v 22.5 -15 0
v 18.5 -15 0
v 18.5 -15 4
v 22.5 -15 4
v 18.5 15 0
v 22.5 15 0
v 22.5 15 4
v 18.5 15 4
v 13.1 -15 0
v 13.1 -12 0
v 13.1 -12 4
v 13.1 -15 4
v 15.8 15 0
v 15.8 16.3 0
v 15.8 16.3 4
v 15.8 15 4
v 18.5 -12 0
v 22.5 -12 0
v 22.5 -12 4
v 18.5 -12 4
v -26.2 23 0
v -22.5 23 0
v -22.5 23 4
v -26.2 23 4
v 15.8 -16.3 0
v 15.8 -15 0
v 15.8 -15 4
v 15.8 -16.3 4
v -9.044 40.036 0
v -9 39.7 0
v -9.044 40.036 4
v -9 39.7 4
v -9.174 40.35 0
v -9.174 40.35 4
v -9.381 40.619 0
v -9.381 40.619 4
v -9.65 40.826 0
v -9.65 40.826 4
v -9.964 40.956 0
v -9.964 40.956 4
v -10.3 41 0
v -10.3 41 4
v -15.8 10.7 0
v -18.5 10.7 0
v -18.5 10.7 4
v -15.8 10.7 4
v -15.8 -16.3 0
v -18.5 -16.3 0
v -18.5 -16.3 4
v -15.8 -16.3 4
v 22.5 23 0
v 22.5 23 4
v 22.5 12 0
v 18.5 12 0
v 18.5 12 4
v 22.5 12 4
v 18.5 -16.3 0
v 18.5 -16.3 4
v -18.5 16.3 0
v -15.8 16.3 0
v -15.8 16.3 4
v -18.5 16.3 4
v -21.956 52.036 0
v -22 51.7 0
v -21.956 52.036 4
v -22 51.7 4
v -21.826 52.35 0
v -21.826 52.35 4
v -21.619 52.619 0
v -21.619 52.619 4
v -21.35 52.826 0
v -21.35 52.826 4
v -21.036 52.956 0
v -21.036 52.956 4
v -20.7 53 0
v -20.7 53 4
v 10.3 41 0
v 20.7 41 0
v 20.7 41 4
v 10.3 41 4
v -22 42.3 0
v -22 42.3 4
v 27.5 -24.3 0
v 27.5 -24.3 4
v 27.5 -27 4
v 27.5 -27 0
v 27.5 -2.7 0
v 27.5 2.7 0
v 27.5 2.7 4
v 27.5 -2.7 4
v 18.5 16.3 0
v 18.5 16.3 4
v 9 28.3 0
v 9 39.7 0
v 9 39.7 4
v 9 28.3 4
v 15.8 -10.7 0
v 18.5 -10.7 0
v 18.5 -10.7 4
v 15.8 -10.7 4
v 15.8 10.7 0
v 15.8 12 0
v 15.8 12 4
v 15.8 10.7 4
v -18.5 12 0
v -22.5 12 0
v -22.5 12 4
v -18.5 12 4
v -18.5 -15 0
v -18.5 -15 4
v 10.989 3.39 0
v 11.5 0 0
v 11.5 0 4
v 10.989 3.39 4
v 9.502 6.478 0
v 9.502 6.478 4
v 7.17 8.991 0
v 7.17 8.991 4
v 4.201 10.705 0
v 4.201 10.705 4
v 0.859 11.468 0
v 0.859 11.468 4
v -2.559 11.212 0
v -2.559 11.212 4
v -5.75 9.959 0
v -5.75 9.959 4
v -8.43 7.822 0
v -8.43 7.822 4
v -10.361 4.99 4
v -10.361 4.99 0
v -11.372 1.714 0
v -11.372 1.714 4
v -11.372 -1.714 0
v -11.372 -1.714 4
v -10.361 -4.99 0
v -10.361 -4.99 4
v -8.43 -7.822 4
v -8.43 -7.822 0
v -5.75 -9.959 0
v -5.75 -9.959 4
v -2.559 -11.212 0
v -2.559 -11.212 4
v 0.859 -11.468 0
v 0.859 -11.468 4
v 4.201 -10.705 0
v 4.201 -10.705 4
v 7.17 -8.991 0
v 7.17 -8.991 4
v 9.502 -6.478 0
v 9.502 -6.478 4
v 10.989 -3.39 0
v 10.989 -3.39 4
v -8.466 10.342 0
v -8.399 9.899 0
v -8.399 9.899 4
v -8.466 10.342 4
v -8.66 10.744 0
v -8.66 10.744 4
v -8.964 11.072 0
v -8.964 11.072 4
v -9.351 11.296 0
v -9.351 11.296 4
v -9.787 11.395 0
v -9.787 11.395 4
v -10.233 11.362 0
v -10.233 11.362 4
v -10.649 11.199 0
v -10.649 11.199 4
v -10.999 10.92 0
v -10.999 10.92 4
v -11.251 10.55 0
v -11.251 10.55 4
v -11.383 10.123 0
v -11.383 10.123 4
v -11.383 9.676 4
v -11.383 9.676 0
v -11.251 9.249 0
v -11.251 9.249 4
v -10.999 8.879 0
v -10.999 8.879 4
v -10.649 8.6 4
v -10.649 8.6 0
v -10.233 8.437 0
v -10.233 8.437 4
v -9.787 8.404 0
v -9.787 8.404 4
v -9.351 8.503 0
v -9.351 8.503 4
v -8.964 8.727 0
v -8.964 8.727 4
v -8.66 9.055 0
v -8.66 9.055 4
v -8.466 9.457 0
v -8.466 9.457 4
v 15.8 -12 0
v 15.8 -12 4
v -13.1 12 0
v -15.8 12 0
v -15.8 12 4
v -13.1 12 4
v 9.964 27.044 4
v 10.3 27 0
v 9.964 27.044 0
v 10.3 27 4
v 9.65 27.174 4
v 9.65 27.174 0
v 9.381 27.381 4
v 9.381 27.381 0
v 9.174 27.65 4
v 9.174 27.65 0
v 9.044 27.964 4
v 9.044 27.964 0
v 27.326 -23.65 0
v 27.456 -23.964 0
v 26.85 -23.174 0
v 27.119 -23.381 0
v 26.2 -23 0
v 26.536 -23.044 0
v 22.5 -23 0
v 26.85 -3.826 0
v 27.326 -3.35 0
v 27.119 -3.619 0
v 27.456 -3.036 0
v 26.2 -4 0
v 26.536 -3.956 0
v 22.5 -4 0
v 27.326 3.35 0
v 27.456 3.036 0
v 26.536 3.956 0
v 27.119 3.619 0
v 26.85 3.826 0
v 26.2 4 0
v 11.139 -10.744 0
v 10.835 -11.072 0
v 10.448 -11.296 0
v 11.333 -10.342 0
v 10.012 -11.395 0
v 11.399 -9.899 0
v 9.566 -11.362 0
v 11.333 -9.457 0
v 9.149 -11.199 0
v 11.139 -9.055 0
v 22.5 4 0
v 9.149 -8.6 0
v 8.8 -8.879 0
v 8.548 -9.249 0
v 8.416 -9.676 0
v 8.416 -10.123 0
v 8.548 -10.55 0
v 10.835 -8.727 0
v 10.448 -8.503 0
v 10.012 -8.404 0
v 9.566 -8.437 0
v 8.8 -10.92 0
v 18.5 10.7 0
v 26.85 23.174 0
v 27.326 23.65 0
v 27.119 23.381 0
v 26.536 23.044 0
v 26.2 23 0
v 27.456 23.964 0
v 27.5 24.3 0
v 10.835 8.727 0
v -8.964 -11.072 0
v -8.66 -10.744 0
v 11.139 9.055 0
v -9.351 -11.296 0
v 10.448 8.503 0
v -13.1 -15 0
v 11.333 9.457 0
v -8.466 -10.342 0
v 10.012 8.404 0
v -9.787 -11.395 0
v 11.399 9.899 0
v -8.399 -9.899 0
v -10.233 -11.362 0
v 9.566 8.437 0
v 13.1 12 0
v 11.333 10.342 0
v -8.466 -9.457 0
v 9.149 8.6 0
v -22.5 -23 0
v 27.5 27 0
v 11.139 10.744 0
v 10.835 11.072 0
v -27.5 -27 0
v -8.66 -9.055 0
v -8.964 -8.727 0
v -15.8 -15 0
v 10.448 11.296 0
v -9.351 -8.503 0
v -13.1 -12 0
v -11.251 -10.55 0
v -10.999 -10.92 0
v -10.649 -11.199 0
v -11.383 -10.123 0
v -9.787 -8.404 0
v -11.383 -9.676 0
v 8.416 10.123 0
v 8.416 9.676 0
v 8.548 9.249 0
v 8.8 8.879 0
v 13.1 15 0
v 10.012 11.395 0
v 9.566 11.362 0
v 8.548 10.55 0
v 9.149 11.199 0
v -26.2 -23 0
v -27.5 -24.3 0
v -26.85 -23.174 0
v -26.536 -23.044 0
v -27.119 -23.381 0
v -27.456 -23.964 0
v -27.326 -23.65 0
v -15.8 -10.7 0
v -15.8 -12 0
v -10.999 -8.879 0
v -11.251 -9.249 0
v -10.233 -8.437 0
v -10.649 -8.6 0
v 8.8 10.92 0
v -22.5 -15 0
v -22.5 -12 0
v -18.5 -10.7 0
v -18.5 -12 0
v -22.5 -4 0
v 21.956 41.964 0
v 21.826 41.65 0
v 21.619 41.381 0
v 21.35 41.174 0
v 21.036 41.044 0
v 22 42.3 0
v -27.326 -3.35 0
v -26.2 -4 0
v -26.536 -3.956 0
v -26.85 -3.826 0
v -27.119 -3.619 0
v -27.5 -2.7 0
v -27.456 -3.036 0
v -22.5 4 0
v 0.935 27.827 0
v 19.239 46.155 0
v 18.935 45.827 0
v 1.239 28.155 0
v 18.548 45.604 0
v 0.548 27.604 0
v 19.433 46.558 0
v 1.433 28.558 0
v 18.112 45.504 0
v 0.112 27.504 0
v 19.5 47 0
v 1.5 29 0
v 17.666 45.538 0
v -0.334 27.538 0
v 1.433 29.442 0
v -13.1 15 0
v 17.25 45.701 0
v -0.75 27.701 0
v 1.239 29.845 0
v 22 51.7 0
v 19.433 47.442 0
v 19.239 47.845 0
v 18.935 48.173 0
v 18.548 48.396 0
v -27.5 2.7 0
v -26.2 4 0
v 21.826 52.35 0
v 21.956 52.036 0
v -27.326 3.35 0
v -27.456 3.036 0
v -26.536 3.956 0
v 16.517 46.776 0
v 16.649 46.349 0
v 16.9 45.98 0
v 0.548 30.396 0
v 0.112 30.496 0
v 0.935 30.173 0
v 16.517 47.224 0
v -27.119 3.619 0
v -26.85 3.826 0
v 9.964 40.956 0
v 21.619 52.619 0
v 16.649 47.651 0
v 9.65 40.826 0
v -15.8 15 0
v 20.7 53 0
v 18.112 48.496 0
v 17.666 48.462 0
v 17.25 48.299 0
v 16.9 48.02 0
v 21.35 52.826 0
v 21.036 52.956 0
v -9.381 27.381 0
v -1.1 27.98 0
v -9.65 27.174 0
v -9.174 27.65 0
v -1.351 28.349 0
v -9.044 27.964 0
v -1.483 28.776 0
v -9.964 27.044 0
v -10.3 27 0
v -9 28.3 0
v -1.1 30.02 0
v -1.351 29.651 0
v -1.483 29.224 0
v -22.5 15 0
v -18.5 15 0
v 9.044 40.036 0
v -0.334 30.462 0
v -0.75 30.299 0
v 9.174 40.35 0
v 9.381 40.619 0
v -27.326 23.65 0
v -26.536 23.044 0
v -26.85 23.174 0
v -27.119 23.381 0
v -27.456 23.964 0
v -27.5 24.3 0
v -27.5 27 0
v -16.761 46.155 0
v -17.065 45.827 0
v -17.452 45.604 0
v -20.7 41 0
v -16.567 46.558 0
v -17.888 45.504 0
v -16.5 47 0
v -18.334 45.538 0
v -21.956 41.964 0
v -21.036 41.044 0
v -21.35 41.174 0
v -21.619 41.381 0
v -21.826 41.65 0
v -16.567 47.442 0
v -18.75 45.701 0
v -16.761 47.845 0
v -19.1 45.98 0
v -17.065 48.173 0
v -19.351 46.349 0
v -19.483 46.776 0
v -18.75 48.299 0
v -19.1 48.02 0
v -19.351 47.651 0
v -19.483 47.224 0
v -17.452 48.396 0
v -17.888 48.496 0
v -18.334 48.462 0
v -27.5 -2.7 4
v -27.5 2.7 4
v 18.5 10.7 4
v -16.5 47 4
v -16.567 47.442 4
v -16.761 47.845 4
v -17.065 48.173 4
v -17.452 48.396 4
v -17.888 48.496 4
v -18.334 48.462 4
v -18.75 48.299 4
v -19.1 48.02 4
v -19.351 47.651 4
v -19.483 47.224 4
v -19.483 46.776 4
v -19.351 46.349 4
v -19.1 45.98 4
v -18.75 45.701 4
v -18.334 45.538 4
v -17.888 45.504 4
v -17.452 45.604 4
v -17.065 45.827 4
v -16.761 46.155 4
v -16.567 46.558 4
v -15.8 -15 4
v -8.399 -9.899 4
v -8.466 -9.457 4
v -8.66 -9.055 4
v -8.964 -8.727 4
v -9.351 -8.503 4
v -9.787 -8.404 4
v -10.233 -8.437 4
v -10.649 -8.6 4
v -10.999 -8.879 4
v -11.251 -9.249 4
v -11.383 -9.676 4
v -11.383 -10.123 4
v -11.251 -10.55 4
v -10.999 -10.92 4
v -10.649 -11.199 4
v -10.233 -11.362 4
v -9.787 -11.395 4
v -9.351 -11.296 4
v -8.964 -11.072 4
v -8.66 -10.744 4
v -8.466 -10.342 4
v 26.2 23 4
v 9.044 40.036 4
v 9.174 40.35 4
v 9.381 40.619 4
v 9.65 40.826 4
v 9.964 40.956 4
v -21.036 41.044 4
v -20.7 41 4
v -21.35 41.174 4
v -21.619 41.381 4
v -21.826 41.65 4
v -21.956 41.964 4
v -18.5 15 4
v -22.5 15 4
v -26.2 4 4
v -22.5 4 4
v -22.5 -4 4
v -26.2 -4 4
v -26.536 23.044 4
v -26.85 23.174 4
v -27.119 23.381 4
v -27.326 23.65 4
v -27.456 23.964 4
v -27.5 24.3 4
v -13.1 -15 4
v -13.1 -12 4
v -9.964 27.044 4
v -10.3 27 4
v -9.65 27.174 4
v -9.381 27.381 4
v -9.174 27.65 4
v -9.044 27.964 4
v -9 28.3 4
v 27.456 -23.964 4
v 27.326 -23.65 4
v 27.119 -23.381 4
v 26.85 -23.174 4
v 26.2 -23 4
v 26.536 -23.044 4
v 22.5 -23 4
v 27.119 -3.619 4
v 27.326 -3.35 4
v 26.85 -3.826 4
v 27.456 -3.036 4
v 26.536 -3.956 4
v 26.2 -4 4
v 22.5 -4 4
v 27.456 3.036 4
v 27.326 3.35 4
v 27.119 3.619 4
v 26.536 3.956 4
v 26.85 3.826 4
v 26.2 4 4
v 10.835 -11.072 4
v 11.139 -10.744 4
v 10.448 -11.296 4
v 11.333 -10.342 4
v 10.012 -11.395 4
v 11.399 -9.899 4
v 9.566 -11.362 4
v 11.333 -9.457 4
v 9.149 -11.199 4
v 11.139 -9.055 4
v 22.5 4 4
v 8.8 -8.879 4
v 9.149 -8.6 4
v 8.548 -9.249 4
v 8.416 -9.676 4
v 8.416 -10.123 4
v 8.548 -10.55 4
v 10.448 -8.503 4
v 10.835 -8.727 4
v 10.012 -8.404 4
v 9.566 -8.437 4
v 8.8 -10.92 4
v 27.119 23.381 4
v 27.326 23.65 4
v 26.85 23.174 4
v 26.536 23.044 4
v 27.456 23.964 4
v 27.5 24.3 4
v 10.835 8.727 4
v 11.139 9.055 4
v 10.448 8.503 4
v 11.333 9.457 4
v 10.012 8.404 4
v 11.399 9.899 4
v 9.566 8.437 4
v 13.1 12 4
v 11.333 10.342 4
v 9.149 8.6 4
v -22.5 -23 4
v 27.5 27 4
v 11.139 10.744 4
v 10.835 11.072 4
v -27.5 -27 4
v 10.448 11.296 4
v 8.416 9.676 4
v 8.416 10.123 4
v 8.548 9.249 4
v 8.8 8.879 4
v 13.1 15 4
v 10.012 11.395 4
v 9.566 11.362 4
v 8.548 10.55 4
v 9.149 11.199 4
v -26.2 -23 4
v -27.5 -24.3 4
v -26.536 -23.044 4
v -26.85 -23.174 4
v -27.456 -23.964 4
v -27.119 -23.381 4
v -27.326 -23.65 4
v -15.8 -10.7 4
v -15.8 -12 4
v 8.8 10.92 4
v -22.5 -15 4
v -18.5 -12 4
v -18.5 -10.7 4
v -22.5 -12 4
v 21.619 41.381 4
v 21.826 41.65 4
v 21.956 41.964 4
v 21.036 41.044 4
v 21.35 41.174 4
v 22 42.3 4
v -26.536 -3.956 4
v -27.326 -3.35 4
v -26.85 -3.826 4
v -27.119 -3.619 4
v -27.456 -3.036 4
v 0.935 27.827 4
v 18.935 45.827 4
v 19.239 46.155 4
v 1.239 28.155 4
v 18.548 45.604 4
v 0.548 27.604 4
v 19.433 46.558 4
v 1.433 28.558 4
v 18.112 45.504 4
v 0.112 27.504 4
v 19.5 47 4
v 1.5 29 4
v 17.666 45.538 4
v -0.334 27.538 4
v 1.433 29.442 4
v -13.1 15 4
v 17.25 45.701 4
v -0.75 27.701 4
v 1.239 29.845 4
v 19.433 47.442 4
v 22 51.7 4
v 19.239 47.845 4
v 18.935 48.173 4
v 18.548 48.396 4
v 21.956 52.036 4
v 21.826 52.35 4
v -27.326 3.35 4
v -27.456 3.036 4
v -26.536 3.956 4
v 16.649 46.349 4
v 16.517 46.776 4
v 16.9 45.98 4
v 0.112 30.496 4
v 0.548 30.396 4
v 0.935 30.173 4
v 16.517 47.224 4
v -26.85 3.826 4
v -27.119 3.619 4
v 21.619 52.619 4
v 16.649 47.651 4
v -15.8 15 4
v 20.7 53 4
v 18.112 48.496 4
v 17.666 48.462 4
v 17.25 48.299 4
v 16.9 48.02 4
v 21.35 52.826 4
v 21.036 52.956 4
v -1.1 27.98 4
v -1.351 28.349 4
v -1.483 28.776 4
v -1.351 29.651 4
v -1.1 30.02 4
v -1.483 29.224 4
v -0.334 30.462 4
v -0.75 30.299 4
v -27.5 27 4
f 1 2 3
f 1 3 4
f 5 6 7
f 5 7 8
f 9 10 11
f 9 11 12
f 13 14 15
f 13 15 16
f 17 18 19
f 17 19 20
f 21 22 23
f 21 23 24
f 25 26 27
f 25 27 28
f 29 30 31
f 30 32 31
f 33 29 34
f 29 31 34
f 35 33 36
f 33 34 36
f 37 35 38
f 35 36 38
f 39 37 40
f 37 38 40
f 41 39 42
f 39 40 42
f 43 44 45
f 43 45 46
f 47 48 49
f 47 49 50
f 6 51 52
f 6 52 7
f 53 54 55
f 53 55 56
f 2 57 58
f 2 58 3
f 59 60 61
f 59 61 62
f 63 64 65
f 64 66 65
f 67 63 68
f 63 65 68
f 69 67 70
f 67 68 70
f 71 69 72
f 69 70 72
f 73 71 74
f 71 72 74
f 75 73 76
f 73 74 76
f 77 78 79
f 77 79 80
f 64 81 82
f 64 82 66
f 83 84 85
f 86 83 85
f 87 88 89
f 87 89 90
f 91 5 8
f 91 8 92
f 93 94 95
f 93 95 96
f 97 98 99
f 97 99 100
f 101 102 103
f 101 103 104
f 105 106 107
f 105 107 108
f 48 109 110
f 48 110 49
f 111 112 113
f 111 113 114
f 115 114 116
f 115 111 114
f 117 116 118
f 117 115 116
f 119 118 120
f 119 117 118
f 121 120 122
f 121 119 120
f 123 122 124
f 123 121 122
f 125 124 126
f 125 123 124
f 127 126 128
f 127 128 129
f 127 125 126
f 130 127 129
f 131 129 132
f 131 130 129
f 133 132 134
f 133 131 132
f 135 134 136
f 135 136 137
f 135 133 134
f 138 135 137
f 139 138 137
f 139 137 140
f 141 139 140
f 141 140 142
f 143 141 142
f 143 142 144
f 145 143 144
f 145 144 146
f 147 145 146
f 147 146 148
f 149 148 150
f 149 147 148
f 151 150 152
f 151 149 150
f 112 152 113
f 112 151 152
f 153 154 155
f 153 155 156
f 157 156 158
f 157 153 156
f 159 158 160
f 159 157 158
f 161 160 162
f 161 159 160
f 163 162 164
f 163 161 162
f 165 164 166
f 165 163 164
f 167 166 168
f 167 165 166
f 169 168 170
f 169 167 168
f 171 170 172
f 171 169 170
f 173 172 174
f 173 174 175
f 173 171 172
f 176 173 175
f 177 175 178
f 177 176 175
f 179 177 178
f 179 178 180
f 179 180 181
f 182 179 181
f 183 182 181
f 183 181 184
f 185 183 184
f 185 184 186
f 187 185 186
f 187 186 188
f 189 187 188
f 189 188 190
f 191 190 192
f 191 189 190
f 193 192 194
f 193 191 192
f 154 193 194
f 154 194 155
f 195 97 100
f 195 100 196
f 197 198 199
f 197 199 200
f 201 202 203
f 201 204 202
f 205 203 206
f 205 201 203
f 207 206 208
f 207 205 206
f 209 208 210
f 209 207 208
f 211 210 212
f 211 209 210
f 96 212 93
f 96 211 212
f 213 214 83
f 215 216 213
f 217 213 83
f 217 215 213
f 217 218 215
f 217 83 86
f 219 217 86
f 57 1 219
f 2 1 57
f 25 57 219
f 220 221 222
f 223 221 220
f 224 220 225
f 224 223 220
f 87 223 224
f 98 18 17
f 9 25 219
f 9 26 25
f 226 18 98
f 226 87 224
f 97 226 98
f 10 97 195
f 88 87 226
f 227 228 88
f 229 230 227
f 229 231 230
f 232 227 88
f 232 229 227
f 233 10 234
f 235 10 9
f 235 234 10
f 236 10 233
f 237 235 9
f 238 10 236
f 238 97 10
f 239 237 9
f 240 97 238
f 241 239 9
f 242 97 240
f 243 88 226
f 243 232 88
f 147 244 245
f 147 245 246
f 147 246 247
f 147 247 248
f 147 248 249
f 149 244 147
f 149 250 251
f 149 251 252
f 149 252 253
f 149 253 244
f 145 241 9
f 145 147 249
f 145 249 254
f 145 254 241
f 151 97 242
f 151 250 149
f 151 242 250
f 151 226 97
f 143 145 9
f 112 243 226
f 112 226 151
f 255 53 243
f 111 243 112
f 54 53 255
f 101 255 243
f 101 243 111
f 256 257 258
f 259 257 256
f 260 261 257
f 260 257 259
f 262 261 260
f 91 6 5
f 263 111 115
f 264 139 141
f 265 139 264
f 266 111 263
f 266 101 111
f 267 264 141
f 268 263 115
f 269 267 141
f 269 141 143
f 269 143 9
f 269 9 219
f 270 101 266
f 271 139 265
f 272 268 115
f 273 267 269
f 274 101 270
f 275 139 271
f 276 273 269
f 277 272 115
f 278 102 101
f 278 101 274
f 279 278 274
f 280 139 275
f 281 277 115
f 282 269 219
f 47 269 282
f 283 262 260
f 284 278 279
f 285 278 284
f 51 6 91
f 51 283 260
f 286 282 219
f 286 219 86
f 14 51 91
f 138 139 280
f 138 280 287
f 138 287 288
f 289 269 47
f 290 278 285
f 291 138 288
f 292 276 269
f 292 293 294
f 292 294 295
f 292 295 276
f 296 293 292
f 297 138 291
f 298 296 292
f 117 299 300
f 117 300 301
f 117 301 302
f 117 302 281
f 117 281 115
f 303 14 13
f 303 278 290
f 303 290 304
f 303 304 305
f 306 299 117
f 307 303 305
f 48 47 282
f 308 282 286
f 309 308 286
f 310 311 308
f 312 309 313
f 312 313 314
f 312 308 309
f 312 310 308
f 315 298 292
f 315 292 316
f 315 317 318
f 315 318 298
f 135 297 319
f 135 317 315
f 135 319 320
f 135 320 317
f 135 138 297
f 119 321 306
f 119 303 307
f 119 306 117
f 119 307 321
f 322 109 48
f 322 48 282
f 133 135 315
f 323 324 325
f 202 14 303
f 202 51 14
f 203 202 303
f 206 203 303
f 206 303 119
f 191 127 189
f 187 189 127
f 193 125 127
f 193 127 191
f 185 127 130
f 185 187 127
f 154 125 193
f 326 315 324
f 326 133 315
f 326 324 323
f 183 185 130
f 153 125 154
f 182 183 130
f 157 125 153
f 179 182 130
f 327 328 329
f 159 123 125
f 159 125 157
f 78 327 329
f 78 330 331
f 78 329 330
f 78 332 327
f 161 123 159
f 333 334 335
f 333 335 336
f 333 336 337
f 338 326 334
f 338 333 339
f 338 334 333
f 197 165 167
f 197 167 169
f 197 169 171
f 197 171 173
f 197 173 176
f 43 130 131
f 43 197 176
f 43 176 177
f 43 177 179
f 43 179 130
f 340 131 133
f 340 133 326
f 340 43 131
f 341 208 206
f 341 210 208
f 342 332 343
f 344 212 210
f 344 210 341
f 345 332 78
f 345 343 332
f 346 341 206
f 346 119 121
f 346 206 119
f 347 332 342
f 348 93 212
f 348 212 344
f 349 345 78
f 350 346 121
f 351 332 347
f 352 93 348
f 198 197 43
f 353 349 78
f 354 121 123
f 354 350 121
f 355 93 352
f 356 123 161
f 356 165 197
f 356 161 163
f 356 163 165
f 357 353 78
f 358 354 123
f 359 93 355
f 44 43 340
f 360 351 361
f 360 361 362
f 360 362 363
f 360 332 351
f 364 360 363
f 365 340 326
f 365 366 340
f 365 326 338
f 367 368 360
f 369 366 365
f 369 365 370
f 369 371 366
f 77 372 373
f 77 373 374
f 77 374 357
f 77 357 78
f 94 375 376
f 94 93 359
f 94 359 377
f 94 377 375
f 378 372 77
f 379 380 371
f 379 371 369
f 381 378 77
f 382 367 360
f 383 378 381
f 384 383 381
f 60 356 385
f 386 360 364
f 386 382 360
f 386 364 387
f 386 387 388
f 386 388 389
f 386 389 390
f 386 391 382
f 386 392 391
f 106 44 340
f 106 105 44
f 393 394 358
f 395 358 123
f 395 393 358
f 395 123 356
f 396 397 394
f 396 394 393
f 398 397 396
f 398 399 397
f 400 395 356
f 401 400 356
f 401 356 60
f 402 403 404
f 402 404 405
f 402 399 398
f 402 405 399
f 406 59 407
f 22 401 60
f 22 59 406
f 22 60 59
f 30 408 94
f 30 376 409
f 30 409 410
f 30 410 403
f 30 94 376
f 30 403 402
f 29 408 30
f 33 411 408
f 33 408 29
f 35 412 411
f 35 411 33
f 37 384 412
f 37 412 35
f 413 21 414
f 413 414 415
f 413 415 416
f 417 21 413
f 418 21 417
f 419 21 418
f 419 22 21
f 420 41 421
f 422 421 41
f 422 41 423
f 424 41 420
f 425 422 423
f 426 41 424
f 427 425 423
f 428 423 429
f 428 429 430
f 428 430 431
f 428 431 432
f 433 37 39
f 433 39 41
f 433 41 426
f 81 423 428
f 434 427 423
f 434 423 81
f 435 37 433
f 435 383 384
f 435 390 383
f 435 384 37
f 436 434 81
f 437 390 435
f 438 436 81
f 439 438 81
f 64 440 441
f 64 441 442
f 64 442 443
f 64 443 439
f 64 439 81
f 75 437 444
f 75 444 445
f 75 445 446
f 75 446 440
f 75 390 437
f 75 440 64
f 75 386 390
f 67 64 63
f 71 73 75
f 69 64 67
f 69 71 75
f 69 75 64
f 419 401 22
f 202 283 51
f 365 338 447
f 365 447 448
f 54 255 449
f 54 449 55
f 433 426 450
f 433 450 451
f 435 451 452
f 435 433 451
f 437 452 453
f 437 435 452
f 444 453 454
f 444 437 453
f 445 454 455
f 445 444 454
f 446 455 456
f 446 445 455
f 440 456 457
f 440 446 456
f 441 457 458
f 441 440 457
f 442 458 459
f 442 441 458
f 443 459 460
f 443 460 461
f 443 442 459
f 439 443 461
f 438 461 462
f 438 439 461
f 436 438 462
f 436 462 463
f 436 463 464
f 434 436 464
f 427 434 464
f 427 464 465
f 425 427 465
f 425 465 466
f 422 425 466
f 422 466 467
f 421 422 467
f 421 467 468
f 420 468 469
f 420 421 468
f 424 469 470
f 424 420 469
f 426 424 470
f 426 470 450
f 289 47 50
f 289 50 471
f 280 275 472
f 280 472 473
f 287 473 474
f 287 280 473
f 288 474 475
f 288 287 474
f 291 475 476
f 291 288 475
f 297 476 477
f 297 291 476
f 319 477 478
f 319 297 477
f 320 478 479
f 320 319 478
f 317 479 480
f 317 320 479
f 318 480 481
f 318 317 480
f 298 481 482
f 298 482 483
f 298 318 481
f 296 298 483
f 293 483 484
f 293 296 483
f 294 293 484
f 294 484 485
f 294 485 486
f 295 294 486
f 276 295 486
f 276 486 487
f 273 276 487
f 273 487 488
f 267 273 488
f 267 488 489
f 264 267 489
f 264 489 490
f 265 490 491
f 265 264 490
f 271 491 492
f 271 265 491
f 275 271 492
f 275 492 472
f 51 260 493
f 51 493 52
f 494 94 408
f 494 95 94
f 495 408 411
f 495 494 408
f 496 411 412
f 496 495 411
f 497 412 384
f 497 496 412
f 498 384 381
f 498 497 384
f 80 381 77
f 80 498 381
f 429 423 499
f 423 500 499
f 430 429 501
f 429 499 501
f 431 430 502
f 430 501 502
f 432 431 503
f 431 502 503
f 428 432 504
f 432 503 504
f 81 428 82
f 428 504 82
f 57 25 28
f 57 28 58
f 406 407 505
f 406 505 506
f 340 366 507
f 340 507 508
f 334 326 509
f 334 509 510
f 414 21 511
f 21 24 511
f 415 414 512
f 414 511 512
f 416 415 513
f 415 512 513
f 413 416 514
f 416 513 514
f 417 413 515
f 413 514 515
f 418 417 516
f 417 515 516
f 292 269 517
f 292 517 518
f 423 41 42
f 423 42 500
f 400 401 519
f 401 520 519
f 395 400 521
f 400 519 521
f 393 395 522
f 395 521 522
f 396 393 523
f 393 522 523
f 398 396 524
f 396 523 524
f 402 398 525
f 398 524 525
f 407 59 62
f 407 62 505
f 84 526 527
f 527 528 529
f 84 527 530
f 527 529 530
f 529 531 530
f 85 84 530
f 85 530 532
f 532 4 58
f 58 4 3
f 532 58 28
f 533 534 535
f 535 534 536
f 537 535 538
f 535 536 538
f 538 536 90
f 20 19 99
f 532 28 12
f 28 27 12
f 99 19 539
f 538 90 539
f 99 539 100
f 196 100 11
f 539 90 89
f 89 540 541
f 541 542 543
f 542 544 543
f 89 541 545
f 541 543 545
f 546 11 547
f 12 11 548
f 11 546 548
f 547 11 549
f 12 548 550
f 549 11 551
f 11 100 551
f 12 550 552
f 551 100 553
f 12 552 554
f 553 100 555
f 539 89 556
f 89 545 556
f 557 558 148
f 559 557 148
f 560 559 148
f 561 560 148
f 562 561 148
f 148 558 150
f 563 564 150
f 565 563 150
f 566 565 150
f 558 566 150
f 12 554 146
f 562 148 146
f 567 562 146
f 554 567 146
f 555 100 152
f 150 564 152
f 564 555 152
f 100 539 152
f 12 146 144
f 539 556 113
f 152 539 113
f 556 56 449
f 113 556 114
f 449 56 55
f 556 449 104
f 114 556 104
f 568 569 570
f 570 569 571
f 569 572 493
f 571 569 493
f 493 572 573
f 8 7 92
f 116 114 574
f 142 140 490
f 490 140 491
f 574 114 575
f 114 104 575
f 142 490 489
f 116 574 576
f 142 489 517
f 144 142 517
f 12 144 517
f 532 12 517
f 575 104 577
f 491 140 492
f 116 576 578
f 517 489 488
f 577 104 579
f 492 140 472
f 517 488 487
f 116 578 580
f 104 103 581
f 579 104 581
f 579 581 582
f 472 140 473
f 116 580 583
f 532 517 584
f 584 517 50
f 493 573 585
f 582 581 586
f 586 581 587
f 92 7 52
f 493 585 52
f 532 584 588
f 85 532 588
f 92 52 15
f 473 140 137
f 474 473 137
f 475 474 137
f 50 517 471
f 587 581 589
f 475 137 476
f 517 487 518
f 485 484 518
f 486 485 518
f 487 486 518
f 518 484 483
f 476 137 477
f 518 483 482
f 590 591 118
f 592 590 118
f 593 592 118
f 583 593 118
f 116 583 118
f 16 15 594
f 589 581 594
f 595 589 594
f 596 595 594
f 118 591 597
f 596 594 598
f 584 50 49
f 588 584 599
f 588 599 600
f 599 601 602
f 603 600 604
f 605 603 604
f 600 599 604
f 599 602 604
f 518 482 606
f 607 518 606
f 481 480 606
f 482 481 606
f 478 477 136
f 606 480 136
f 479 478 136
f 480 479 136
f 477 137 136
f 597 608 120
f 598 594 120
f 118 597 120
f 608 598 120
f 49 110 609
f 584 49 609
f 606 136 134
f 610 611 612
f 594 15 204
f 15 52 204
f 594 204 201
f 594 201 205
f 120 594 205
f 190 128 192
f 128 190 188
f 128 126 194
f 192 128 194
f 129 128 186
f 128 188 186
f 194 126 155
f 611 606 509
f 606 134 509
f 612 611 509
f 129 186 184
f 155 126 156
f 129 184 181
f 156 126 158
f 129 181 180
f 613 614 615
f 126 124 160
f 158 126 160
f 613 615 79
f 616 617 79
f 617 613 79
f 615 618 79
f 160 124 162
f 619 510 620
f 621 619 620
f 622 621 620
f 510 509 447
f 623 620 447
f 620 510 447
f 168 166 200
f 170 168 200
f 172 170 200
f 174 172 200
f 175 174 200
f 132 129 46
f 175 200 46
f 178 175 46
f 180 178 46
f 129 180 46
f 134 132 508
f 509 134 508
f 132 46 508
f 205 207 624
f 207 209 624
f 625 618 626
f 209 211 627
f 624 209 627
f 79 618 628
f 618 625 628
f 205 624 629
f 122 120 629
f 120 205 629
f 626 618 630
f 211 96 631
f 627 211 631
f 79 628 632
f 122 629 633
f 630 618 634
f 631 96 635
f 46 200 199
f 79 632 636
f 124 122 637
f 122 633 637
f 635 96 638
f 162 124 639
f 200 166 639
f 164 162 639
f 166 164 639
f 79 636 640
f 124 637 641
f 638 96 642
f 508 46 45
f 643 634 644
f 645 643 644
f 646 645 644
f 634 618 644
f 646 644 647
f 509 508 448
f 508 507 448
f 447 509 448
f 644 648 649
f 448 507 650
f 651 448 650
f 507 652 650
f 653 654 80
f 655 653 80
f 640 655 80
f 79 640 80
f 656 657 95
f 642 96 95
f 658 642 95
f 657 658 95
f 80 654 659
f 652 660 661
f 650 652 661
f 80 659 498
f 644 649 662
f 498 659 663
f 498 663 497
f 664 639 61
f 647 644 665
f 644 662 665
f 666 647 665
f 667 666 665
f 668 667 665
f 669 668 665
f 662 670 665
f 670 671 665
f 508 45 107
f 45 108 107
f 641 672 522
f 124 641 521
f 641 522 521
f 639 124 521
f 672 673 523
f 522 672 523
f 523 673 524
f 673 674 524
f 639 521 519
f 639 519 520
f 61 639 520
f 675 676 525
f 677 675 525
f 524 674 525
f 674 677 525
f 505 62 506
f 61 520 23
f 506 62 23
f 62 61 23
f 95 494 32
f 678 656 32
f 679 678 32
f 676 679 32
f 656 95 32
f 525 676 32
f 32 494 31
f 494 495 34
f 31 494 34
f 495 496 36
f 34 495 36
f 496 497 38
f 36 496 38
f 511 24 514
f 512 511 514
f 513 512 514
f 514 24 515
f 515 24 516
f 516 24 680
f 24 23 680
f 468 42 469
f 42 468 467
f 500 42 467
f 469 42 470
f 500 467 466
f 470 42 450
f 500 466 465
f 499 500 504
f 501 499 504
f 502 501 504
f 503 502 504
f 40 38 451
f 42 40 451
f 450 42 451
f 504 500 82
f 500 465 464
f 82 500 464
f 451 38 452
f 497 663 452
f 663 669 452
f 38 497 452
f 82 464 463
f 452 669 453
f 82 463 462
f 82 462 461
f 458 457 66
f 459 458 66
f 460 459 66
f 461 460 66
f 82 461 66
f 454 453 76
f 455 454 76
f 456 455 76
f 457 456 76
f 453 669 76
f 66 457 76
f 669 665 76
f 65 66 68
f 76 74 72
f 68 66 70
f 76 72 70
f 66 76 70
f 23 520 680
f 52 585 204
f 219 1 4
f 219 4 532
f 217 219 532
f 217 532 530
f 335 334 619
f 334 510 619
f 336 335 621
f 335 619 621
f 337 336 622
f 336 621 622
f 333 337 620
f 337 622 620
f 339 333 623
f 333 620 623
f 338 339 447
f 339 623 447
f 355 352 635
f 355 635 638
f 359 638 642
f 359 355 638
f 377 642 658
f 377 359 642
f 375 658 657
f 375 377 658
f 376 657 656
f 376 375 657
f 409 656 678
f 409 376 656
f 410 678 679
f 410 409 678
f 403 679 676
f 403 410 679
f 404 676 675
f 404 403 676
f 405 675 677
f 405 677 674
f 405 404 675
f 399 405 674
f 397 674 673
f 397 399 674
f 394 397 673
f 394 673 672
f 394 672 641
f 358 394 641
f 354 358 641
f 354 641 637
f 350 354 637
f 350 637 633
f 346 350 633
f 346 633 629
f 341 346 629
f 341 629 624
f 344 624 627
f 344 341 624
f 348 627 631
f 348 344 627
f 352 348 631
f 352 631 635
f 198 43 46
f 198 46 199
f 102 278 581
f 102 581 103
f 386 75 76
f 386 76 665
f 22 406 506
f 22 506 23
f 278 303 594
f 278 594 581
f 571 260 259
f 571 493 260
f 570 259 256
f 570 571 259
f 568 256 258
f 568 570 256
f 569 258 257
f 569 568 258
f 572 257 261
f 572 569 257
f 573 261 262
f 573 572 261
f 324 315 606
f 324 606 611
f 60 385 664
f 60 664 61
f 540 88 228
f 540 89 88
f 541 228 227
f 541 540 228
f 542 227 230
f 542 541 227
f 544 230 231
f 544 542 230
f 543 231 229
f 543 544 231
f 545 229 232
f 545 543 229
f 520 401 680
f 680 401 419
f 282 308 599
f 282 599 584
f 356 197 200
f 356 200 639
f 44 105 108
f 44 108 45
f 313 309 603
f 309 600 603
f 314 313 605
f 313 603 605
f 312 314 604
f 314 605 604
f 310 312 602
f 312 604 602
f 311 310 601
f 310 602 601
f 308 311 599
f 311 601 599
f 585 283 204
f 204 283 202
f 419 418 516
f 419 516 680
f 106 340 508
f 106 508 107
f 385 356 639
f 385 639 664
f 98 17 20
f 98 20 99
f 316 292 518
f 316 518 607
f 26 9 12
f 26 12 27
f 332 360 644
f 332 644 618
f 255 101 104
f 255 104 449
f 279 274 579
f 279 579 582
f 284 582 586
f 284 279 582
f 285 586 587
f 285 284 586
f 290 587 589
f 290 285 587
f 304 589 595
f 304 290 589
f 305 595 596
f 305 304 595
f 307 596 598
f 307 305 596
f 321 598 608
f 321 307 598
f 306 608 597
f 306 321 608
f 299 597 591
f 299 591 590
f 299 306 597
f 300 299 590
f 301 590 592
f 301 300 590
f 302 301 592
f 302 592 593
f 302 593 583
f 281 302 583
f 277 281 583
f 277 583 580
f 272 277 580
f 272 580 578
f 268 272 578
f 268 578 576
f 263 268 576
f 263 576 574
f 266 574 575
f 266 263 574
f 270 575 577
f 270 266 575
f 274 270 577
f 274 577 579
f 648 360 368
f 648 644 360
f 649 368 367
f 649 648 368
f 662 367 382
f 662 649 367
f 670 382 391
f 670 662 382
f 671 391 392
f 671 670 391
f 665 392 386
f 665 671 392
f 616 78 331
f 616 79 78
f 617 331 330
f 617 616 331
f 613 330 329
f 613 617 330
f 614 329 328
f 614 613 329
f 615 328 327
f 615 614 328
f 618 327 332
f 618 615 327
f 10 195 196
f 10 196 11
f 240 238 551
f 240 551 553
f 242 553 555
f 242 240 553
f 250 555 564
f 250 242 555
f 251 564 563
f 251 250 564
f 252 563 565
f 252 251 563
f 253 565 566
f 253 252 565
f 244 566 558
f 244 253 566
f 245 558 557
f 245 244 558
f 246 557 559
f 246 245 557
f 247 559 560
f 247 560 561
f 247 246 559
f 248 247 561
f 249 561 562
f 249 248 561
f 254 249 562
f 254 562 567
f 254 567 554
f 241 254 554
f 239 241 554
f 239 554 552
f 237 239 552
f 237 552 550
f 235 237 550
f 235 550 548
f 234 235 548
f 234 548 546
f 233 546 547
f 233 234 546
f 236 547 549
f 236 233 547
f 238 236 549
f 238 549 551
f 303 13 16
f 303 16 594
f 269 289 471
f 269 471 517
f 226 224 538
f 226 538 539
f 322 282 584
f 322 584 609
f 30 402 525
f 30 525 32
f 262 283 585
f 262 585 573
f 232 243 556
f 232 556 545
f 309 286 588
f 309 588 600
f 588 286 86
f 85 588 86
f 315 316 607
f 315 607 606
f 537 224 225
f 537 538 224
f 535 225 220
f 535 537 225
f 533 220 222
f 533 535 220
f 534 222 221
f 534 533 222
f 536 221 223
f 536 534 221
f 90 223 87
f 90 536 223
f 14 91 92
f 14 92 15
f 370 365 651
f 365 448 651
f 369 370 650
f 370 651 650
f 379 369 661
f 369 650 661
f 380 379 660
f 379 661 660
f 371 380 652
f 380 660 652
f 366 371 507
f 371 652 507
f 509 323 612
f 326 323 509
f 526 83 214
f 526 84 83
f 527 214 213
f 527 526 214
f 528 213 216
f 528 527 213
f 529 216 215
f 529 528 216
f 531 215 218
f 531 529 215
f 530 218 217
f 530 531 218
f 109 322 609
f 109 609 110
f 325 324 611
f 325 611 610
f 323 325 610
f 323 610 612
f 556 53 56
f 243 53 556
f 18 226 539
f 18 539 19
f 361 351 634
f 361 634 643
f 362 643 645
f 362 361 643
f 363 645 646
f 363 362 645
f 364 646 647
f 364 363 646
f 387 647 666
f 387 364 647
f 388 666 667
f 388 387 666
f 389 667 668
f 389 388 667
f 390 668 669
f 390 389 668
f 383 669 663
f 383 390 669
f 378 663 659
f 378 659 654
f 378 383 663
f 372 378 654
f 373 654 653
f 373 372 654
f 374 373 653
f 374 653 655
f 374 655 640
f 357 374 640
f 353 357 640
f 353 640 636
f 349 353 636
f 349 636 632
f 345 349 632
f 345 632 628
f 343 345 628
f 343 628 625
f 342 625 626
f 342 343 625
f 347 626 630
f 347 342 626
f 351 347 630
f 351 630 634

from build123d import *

# Parameters (mm, degrees)
SKETCH_1_R      = 1.5
SKETCH_1_R_2    = 11.5
EXTRUDE_1_DEPTH = 4
FILLET_1_R      = 1.3


with BuildPart() as part:
    # 草图1 → 凸台-拉伸1 (new body)
    with BuildSketch(Plane.XY):
        Polygon((22.5, -27), (-22.5, -27), (-27.5, -27), (-27.5, -23), (-22.5, -23), (-22.5, -15), (-18.5, -15), (-18.5, -16.3), (-15.8, -16.3), (-15.8, -15), (-13.1, -15), (-13.1, -12), (-15.8, -12), (-15.8, -10.7), (-18.5, -10.7), (-18.5, -12), (-22.5, -12), (-22.5, -4), (-27.5, -4), (-27.5, 4), (-22.5, 4), (-22.5, 12), (-18.5, 12), (-18.5, 10.7), (-15.8, 10.7), (-15.8, 12), (-13.1, 12), (-13.1, 15), (-15.8, 15), (-15.8, 16.3), (-18.5, 16.3), (-18.5, 15), (-22.5, 15), (-22.5, 23), (-27.5, 23), (-27.5, 27), (-22.5, 27), (-9, 27), (-9, 41), (-22, 41), (-22, 53), (22, 53), (22, 41), (9, 41), (9, 27), (22.5, 27), (27.5, 27), (27.5, 23), (22.5, 23), (22.5, 15), (18.5, 15), (18.5, 16.3), (15.8, 16.3), (15.8, 15), (13.1, 15), (13.1, 12), (15.8, 12), (15.8, 10.7), (18.5, 10.7), (18.5, 12), (22.5, 12), (22.5, 4), (27.5, 4), (27.5, -4), (22.5, -4), (22.5, -12), (18.5, -12), (18.5, -10.7), (15.8, -10.7), (15.8, -12), (13.1, -12), (13.1, -15), (15.8, -15), (15.8, -16.3), (18.5, -16.3), (18.5, -15), (22.5, -15), (22.5, -23), (27.5, -23), (27.5, -27), align=None)
        with Locations((9.899494937, 9.899494937)):
            Circle(SKETCH_1_R, mode=Mode.SUBTRACT)
        Circle(SKETCH_1_R_2, mode=Mode.SUBTRACT)
        with Locations((9.899494937, -9.899494937)):
            Circle(SKETCH_1_R, mode=Mode.SUBTRACT)
        with Locations((-9.899494937, -9.899494937)):
            Circle(SKETCH_1_R, mode=Mode.SUBTRACT)
        with Locations((-9.899494937, 9.899494937)):
            Circle(SKETCH_1_R, mode=Mode.SUBTRACT)
        with Locations((-18, 47)):
            Circle(SKETCH_1_R, mode=Mode.SUBTRACT)
        with Locations((18, 47)):
            Circle(SKETCH_1_R, mode=Mode.SUBTRACT)
        with Locations((0, 29)):
            Circle(SKETCH_1_R, mode=Mode.SUBTRACT)
    extrude(amount=EXTRUDE_1_DEPTH)

    # 圆角1
    fillet_1_edges = [part.edges().sort_by_distance(p)[0] for p in [
        (-9, 27, 2),
        (-9, 41, 2),
        (-22, 41, 2),
        (-22, 53, 2),
        (22, 53, 2),
        (22, 41, 2),
        (9, 41, 2),
        (9, 27, 2),
        (27.5, 23, 2),
        (27.5, 4, 2),
        (27.5, -4, 2),
        (27.5, -23, 2),
        (-27.5, -23, 2),
        (-27.5, -4, 2),
        (-27.5, 4, 2),
        (-27.5, 23, 2),
    ]]
    fillet(fillet_1_edges, radius=FILLET_1_R)


solid = part.part
